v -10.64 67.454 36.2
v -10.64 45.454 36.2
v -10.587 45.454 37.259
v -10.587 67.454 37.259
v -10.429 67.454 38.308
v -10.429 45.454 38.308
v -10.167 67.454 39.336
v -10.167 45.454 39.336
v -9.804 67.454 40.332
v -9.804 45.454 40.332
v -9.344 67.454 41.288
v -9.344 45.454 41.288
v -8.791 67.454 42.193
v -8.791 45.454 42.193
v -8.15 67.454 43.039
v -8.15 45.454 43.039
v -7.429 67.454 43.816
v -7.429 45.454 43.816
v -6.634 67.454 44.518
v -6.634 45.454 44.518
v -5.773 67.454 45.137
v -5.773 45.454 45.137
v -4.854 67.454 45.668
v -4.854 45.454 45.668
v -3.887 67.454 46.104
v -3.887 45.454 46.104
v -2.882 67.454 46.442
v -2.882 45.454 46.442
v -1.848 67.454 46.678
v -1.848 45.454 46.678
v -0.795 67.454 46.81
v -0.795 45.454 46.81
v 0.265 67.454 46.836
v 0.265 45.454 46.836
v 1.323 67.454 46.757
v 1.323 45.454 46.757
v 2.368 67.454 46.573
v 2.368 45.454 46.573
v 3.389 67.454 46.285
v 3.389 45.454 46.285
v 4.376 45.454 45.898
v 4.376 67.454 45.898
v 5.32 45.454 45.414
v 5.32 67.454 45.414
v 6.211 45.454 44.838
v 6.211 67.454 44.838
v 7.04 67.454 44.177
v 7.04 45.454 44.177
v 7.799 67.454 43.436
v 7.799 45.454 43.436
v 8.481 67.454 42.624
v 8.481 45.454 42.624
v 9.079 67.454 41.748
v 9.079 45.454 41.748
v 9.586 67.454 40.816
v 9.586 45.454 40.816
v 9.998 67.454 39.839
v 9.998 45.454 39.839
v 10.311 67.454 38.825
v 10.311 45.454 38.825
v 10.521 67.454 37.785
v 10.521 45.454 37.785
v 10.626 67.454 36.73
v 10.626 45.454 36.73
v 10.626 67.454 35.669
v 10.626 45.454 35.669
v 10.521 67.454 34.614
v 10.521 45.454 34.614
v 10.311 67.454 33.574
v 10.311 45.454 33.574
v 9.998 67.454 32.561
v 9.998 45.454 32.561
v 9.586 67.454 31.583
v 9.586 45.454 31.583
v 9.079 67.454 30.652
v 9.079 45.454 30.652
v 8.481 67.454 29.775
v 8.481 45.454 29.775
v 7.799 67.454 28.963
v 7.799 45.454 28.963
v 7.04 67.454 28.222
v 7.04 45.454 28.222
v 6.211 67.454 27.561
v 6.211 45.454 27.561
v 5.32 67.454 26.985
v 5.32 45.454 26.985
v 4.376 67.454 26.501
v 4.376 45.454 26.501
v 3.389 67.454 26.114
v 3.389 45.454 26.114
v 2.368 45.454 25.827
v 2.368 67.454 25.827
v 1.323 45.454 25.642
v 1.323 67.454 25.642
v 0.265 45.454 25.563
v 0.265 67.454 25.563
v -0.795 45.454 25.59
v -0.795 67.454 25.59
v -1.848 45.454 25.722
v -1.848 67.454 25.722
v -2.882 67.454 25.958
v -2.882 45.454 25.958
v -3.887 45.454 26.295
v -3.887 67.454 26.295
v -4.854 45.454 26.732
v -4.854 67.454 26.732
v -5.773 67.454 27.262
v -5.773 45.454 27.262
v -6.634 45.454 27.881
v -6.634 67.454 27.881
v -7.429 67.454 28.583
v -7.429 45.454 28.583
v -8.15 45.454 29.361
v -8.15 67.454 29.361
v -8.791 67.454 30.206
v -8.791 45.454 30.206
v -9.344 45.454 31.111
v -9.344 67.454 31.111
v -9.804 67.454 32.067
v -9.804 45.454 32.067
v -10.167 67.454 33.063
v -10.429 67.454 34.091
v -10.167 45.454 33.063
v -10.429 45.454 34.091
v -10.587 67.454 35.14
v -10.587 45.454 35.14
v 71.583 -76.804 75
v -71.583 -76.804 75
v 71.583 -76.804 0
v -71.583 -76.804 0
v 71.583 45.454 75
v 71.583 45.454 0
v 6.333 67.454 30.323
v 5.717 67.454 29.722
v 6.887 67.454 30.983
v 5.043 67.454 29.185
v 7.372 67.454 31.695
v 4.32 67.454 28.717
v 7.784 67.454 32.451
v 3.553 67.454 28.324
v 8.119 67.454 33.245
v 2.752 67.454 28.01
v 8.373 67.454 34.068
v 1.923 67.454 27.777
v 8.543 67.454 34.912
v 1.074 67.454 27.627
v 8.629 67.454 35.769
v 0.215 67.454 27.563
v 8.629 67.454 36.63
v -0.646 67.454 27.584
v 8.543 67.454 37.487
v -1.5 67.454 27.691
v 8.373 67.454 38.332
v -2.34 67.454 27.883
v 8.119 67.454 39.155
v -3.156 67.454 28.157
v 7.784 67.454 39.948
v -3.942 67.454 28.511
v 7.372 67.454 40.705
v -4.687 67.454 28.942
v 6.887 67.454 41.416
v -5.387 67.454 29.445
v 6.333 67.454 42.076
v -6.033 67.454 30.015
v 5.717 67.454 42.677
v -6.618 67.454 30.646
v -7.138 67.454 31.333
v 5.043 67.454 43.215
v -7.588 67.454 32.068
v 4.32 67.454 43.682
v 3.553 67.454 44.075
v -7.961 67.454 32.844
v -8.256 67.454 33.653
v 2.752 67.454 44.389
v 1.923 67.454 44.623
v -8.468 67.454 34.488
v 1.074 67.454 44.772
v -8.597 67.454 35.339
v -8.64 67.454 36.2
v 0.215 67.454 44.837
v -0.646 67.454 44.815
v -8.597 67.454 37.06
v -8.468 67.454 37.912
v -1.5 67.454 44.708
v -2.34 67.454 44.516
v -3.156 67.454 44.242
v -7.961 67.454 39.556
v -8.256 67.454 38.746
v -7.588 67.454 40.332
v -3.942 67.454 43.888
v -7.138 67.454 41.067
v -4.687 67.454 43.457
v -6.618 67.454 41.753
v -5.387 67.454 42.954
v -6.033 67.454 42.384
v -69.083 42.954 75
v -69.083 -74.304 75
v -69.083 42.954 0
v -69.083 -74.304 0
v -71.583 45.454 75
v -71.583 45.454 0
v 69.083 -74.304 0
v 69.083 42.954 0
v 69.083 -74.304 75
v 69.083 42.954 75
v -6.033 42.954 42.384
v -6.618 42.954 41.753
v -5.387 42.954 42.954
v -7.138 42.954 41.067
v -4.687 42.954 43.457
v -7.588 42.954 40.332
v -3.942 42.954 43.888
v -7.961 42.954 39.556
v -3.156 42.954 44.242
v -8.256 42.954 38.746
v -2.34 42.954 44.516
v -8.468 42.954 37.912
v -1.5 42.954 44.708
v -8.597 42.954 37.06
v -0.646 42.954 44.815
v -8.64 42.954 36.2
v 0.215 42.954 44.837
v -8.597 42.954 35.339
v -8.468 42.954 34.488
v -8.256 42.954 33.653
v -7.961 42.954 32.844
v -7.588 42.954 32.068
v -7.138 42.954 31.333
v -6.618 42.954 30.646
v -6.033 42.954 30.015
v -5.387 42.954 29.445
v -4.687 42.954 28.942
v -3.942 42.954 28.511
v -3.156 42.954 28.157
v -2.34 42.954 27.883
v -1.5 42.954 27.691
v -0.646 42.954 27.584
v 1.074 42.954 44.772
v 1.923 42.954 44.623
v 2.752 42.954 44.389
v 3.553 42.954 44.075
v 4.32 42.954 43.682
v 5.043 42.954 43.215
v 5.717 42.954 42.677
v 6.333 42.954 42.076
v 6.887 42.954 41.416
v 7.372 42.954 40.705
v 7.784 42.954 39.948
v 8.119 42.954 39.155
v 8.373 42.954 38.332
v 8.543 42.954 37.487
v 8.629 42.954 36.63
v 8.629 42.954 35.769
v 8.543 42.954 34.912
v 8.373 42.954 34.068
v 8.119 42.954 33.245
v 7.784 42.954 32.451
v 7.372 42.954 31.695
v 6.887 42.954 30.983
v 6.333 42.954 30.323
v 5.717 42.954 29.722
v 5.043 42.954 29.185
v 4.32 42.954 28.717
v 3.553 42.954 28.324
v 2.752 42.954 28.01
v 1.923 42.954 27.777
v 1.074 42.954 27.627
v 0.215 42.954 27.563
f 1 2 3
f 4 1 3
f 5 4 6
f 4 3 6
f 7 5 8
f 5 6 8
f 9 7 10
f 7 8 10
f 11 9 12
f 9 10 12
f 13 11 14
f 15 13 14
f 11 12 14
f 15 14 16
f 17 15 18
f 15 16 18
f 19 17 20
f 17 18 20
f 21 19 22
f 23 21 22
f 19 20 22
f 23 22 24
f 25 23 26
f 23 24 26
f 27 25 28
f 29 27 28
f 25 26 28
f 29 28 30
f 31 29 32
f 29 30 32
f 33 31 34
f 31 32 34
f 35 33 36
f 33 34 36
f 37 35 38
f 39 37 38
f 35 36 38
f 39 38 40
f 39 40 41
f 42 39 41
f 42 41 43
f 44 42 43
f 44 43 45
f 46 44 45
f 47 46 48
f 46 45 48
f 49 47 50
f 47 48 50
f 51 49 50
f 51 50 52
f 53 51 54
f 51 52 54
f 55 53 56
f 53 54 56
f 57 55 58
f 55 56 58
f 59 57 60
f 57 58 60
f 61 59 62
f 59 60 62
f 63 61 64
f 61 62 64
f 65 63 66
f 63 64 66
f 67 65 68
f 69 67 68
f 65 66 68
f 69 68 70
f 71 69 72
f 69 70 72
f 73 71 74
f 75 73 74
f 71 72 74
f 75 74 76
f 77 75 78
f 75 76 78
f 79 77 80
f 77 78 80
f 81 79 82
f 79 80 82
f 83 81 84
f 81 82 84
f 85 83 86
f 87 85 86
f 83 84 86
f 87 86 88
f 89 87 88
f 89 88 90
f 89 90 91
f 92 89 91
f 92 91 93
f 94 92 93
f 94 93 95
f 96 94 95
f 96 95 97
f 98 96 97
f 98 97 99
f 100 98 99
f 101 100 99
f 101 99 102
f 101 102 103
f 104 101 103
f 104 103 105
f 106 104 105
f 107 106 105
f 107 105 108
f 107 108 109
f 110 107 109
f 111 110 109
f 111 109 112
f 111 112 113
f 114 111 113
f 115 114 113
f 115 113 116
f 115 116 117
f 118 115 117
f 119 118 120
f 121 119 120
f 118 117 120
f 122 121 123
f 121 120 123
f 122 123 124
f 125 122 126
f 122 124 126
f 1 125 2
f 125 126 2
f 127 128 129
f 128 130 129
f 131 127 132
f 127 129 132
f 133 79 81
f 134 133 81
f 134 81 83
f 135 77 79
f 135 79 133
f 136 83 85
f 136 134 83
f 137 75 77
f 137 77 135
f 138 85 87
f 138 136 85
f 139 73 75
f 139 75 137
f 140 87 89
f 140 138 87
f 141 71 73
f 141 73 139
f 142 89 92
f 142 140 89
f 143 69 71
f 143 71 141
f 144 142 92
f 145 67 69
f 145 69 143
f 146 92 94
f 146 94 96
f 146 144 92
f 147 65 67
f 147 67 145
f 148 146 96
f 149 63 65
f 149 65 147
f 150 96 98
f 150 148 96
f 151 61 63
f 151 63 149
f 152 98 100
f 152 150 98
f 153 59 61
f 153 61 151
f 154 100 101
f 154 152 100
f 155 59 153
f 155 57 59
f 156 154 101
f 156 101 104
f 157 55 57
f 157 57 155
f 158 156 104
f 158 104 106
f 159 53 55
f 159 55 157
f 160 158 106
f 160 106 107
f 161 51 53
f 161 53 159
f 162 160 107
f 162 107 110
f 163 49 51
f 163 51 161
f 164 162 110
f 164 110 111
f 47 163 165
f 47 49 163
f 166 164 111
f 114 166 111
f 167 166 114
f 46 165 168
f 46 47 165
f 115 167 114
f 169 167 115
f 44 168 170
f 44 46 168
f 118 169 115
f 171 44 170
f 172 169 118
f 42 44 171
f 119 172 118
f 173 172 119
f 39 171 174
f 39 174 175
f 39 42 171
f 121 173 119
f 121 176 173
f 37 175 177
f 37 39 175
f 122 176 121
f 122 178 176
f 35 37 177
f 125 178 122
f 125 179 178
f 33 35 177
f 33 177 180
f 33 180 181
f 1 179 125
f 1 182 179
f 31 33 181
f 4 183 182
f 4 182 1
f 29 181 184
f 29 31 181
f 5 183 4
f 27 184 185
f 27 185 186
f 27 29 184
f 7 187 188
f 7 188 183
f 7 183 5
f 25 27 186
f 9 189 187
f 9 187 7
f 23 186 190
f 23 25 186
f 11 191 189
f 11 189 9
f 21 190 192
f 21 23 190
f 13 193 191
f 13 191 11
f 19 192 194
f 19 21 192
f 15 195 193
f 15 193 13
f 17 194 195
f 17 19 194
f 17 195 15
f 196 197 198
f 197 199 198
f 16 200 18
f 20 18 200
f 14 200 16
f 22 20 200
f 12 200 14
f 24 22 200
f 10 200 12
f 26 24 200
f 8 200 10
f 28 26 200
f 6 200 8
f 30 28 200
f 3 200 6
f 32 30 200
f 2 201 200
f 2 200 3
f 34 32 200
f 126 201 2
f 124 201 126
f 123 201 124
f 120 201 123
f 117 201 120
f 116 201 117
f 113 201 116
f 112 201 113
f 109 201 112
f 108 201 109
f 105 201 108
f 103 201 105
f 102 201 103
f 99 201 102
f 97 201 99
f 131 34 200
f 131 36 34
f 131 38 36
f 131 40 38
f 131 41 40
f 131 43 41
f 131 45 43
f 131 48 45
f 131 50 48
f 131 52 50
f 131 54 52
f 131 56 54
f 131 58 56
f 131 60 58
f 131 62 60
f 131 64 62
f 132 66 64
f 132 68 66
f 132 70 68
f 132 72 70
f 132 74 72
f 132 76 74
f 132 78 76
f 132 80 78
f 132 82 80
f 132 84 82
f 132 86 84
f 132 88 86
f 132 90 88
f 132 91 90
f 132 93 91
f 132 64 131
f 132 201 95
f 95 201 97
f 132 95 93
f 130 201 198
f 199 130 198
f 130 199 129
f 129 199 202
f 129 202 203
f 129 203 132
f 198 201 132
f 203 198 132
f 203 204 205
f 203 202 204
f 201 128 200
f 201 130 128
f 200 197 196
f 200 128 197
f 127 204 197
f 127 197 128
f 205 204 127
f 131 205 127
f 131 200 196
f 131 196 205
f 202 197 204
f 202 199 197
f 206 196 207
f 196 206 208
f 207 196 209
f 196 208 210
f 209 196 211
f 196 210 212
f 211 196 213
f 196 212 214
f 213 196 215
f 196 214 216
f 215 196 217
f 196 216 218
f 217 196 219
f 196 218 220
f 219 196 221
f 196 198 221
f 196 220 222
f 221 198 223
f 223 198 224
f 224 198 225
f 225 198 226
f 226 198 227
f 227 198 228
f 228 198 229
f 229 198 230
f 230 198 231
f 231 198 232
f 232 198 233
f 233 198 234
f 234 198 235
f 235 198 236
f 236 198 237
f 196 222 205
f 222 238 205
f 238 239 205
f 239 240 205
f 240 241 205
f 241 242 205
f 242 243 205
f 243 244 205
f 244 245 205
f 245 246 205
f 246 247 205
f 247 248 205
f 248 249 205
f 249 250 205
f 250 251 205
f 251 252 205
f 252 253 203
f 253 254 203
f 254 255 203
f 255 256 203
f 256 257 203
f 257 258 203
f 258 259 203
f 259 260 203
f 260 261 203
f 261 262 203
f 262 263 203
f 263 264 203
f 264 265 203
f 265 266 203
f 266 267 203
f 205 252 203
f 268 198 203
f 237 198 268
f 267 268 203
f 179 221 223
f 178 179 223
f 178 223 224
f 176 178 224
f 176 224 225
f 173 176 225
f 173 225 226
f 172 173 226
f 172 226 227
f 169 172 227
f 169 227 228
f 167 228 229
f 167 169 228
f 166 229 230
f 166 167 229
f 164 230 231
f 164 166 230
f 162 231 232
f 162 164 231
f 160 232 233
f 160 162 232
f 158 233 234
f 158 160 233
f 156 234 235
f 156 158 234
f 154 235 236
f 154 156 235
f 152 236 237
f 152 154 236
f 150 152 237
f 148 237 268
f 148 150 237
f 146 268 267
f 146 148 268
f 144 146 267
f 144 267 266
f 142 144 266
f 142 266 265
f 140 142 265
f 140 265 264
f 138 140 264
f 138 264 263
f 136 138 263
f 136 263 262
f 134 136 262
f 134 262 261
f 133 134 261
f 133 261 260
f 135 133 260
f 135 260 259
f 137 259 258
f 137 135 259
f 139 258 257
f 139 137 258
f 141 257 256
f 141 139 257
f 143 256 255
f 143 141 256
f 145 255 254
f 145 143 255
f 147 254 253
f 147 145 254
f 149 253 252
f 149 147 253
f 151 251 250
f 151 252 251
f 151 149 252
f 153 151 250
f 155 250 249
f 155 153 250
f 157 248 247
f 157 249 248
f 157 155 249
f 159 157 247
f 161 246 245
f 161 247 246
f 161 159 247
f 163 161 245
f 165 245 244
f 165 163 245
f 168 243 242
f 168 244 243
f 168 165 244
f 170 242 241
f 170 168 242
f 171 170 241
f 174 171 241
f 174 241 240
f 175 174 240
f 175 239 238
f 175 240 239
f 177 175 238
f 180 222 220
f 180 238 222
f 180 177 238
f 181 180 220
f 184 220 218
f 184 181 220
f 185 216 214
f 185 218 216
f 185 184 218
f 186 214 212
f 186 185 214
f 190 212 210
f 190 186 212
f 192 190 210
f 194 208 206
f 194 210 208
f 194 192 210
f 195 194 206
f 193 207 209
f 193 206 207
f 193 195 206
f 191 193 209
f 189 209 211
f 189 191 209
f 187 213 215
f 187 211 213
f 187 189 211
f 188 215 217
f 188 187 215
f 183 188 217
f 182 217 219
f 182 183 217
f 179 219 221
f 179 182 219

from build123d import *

# Parameters (mm, degrees)
F0_W     = 143.1653276086
F0_H     = 97.2580723464
F1_DEPTH = 25
F2_DEPTH = 25
F3_DEPTH = 25
F4_DEPTH = 25
F5_T     = -2.5
F6_R     = 10.6397034599
F7_DEPTH = 22
F8_T     = -2
F9_DEPTH = 25


with BuildPart() as f1:
    # F0 (on Top) → F1 (new body)
    with BuildSketch(Plane.XY):
        with Locations((3.7253e-06, -3.1754020602)):
            Rectangle(F0_W, F0_H)
    extrude(amount=F1_DEPTH)

    # F2 (add): faces of the model
    f2_faces = [f1.faces().sort_by_distance(p)[0] for p in [
        (3.7253e-06, -51.8044382334, 12.5),
        (3.7253e-06, 45.4536341131, 12.5),
    ]]
    extrude(f2_faces, amount=F2_DEPTH, dir=(0, -1, 0))

    # F3 (add): faces of the model
    f3_faces = [f1.faces().sort_by_distance(p)[0] for p in [
        (3.7253e-06, -15.6754020602, 25),
        (3.7253e-06, -15.6754020602, 0),
    ]]
    extrude(f3_faces, amount=F3_DEPTH, dir=(0, 0, 1))

    # F4 (add): faces of the model
    f4_faces = [f1.faces().sort_by_distance(p)[0] for p in [
        (3.7253e-06, -15.6754020602, 50),
        (3.7253e-06, -15.6754020602, 0),
    ]]
    extrude(f4_faces, amount=F4_DEPTH, dir=(0, 0, 1))

    # F5
    f5_openings = [f1.faces().sort_by_distance(p)[0] for p in [
        (4e-06, -15.675402, 0),
        (4e-06, -15.675402, 75),
    ]]
    offset(amount=F5_T, openings=f5_openings)

    # F6 (on face) → F7 (join)
    with BuildSketch(Plane(origin=(0, 45.4536341131, 0), x_dir=(-1, 0, 0), z_dir=(0, 1, 0))):
        with Locations((0, 36.1995995045)):
            Circle(F6_R)
    extrude(amount=F7_DEPTH)

    # F8
    f8_openings = [f1.faces().sort_by_distance(p)[0] for p in [
        (0, 67.453634, 36.1996),
    ]]
    offset(amount=F8_T, openings=f8_openings, kind=Kind.INTERSECTION)

    # F9 (cut): a face of the model
    f9_faces = [f1.faces().sort_by_distance(p)[0] for p in [
        (0, 44.9536341131, 36.1995995045),
    ]]
    extrude(f9_faces, amount=-F9_DEPTH, mode=Mode.SUBTRACT)


solid = f1.part
